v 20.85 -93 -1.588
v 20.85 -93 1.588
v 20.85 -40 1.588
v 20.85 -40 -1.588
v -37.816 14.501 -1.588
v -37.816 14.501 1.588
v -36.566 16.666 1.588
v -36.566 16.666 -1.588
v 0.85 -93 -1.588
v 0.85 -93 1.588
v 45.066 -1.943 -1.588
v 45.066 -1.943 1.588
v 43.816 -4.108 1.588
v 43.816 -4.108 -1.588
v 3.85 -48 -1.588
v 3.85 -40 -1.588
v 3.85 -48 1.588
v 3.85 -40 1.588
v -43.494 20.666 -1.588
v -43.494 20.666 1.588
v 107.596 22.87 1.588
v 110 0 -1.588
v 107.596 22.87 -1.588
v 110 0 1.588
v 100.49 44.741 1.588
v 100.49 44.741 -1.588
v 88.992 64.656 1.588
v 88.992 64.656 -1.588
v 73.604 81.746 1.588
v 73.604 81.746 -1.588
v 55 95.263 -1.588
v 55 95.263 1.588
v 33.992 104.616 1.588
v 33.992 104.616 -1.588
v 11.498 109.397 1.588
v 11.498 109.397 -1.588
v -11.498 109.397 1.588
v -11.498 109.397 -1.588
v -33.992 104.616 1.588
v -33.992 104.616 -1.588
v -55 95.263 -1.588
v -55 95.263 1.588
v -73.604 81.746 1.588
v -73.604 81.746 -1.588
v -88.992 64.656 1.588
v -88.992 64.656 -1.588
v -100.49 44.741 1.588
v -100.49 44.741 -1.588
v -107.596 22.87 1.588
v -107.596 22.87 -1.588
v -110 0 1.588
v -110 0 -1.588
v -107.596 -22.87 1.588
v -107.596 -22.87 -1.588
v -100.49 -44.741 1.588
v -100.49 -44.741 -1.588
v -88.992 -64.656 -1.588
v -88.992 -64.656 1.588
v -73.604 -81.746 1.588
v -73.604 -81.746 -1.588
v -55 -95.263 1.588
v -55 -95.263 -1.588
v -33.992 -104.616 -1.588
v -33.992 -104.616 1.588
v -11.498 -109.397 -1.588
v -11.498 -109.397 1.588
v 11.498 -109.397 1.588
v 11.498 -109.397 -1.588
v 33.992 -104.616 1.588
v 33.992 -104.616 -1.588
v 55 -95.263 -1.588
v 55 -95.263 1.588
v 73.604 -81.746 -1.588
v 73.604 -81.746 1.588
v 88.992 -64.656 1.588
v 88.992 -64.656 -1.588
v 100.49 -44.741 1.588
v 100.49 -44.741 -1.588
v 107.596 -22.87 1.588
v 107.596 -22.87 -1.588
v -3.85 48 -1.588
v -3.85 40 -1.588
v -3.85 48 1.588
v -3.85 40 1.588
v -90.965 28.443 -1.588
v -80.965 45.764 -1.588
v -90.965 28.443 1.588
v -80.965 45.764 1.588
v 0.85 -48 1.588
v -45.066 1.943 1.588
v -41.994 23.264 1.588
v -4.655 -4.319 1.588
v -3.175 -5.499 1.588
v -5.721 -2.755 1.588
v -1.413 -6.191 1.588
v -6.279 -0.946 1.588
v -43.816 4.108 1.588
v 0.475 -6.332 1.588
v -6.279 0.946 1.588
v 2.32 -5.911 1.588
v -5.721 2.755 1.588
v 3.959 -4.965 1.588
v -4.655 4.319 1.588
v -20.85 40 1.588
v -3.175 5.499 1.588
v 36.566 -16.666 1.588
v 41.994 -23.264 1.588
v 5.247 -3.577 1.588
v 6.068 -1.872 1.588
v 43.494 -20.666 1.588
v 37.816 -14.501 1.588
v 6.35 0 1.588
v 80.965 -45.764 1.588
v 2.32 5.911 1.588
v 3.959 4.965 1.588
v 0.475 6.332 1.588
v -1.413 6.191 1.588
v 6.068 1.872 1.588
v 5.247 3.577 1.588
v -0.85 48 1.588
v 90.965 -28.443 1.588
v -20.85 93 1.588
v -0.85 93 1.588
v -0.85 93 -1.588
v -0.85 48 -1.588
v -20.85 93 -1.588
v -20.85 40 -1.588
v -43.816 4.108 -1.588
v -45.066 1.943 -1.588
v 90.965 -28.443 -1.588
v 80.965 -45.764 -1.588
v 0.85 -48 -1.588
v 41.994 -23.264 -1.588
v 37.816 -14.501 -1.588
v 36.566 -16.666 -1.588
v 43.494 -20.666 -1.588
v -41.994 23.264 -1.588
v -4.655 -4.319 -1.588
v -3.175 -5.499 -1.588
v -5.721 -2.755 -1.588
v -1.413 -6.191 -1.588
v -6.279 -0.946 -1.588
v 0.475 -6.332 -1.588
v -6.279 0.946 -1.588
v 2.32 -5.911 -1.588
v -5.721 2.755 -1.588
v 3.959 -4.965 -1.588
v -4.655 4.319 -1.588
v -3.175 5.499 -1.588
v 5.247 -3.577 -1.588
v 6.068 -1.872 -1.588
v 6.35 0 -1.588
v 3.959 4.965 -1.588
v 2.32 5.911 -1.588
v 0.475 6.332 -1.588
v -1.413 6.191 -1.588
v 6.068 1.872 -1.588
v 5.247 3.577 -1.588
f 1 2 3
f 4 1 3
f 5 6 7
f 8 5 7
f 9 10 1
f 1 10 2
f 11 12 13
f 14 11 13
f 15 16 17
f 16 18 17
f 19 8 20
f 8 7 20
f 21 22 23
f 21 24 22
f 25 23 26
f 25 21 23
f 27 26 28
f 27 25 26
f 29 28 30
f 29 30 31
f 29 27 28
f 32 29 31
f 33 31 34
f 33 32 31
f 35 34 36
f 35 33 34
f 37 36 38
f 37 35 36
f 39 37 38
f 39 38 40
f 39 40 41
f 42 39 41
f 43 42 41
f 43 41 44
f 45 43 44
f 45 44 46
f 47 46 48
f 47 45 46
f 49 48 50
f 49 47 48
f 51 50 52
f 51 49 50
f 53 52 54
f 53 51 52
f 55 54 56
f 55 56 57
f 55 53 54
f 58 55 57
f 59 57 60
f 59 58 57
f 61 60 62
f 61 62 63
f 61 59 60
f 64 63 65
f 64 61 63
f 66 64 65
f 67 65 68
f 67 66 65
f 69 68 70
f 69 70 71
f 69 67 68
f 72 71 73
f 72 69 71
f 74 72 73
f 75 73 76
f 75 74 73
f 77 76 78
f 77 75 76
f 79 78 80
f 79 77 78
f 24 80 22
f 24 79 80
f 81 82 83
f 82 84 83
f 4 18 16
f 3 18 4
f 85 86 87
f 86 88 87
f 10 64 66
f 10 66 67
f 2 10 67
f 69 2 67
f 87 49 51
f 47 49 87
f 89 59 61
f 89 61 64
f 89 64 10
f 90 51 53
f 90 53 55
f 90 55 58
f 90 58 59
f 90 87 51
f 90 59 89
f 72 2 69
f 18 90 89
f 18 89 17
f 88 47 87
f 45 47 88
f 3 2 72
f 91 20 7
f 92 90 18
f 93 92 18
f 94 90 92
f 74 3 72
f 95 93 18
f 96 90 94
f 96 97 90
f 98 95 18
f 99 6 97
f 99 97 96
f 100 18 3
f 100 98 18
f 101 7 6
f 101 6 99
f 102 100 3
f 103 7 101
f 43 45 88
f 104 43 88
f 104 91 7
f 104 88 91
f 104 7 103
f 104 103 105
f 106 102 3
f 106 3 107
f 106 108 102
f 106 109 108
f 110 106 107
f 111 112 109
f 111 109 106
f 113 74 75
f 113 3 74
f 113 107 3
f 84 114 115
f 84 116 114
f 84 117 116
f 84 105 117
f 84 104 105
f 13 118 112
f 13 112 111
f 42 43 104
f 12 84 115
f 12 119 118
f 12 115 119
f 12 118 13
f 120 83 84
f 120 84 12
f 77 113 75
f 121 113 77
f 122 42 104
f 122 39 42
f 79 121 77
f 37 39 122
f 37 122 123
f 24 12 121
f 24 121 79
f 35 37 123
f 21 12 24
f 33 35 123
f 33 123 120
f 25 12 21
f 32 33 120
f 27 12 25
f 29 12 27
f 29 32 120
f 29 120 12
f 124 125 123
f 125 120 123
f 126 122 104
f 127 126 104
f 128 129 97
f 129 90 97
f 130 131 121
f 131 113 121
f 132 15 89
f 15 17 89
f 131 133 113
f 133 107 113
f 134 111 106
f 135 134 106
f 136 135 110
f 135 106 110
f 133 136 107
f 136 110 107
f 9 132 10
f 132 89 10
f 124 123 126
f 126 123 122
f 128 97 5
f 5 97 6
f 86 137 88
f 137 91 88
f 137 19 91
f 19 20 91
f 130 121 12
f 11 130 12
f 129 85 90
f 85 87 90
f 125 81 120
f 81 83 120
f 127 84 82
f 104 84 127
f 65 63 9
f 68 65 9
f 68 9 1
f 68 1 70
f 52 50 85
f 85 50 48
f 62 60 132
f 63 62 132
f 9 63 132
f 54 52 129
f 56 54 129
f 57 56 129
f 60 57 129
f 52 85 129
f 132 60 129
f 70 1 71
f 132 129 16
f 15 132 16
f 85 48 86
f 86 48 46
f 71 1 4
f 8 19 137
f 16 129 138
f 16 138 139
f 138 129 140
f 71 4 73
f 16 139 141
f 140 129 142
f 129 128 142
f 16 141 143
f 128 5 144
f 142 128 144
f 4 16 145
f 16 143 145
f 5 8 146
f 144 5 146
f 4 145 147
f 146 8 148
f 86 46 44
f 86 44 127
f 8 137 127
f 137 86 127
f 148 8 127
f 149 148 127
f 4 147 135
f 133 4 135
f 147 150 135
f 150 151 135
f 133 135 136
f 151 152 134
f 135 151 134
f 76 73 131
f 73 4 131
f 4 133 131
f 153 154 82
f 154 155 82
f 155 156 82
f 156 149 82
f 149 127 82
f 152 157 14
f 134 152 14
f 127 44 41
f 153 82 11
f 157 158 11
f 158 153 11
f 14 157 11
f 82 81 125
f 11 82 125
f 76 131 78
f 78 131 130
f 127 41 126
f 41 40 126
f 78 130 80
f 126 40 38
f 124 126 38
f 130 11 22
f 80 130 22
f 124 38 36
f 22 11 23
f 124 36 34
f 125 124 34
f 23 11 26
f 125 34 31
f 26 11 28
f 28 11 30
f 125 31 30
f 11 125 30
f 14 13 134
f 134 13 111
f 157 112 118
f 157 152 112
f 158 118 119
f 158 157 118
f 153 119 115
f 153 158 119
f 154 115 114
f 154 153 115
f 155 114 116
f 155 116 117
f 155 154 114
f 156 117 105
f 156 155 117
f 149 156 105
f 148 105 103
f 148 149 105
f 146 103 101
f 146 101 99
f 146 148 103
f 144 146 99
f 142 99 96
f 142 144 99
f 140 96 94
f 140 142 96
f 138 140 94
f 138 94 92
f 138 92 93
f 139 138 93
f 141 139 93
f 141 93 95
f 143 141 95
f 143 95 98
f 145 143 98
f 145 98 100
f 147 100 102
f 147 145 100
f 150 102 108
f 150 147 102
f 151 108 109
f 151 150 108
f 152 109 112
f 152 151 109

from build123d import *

# Parameters (mm, degrees)
SKETCH1_R           = 110
SKETCH1_R_2         = 6.35
BOSS_EXTRUDE1_DEPTH = 1.5875


with BuildPart() as part:
    # Sketch1 → Boss-Extrude1 (new body, symmetric)
    with BuildSketch(Plane.XY):
        Circle(SKETCH1_R)
        Circle(SKETCH1_R_2, mode=Mode.SUBTRACT)
        Polygon((-6.35, 40), (-3.85, 40), (-3.85, 48), (-0.85, 48), (-0.85, 93), (-20.85, 93), (-20.85, 40), (-18.35, 40), align=None, mode=Mode.SUBTRACT)
        Polygon((6.35, -40), (3.85, -40), (3.85, -48), (0.85, -48), (0.85, -93), (20.85, -93), (20.85, -40), (18.35, -40), align=None, mode=Mode.SUBTRACT)
        Polygon((37.816016151, -14.500738686), (36.566016151, -16.665802195), (43.494219382, -20.665802195), (41.994219382, -23.263878407), (80.965362552, -45.763878407), (90.965362552, -28.443370331), (45.066016151, -1.943370331), (43.816016151, -4.108433841), align=None, mode=Mode.SUBTRACT)
        Polygon((-37.816016151, 14.500738686), (-36.566016151, 16.665802195), (-43.494219382, 20.665802195), (-41.994219382, 23.263878407), (-80.965362552, 45.763878407), (-90.965362552, 28.443370331), (-45.066016151, 1.943370331), (-43.816016151, 4.108433841), align=None, mode=Mode.SUBTRACT)
    extrude(amount=BOSS_EXTRUDE1_DEPTH, both=True)


solid = part.part
